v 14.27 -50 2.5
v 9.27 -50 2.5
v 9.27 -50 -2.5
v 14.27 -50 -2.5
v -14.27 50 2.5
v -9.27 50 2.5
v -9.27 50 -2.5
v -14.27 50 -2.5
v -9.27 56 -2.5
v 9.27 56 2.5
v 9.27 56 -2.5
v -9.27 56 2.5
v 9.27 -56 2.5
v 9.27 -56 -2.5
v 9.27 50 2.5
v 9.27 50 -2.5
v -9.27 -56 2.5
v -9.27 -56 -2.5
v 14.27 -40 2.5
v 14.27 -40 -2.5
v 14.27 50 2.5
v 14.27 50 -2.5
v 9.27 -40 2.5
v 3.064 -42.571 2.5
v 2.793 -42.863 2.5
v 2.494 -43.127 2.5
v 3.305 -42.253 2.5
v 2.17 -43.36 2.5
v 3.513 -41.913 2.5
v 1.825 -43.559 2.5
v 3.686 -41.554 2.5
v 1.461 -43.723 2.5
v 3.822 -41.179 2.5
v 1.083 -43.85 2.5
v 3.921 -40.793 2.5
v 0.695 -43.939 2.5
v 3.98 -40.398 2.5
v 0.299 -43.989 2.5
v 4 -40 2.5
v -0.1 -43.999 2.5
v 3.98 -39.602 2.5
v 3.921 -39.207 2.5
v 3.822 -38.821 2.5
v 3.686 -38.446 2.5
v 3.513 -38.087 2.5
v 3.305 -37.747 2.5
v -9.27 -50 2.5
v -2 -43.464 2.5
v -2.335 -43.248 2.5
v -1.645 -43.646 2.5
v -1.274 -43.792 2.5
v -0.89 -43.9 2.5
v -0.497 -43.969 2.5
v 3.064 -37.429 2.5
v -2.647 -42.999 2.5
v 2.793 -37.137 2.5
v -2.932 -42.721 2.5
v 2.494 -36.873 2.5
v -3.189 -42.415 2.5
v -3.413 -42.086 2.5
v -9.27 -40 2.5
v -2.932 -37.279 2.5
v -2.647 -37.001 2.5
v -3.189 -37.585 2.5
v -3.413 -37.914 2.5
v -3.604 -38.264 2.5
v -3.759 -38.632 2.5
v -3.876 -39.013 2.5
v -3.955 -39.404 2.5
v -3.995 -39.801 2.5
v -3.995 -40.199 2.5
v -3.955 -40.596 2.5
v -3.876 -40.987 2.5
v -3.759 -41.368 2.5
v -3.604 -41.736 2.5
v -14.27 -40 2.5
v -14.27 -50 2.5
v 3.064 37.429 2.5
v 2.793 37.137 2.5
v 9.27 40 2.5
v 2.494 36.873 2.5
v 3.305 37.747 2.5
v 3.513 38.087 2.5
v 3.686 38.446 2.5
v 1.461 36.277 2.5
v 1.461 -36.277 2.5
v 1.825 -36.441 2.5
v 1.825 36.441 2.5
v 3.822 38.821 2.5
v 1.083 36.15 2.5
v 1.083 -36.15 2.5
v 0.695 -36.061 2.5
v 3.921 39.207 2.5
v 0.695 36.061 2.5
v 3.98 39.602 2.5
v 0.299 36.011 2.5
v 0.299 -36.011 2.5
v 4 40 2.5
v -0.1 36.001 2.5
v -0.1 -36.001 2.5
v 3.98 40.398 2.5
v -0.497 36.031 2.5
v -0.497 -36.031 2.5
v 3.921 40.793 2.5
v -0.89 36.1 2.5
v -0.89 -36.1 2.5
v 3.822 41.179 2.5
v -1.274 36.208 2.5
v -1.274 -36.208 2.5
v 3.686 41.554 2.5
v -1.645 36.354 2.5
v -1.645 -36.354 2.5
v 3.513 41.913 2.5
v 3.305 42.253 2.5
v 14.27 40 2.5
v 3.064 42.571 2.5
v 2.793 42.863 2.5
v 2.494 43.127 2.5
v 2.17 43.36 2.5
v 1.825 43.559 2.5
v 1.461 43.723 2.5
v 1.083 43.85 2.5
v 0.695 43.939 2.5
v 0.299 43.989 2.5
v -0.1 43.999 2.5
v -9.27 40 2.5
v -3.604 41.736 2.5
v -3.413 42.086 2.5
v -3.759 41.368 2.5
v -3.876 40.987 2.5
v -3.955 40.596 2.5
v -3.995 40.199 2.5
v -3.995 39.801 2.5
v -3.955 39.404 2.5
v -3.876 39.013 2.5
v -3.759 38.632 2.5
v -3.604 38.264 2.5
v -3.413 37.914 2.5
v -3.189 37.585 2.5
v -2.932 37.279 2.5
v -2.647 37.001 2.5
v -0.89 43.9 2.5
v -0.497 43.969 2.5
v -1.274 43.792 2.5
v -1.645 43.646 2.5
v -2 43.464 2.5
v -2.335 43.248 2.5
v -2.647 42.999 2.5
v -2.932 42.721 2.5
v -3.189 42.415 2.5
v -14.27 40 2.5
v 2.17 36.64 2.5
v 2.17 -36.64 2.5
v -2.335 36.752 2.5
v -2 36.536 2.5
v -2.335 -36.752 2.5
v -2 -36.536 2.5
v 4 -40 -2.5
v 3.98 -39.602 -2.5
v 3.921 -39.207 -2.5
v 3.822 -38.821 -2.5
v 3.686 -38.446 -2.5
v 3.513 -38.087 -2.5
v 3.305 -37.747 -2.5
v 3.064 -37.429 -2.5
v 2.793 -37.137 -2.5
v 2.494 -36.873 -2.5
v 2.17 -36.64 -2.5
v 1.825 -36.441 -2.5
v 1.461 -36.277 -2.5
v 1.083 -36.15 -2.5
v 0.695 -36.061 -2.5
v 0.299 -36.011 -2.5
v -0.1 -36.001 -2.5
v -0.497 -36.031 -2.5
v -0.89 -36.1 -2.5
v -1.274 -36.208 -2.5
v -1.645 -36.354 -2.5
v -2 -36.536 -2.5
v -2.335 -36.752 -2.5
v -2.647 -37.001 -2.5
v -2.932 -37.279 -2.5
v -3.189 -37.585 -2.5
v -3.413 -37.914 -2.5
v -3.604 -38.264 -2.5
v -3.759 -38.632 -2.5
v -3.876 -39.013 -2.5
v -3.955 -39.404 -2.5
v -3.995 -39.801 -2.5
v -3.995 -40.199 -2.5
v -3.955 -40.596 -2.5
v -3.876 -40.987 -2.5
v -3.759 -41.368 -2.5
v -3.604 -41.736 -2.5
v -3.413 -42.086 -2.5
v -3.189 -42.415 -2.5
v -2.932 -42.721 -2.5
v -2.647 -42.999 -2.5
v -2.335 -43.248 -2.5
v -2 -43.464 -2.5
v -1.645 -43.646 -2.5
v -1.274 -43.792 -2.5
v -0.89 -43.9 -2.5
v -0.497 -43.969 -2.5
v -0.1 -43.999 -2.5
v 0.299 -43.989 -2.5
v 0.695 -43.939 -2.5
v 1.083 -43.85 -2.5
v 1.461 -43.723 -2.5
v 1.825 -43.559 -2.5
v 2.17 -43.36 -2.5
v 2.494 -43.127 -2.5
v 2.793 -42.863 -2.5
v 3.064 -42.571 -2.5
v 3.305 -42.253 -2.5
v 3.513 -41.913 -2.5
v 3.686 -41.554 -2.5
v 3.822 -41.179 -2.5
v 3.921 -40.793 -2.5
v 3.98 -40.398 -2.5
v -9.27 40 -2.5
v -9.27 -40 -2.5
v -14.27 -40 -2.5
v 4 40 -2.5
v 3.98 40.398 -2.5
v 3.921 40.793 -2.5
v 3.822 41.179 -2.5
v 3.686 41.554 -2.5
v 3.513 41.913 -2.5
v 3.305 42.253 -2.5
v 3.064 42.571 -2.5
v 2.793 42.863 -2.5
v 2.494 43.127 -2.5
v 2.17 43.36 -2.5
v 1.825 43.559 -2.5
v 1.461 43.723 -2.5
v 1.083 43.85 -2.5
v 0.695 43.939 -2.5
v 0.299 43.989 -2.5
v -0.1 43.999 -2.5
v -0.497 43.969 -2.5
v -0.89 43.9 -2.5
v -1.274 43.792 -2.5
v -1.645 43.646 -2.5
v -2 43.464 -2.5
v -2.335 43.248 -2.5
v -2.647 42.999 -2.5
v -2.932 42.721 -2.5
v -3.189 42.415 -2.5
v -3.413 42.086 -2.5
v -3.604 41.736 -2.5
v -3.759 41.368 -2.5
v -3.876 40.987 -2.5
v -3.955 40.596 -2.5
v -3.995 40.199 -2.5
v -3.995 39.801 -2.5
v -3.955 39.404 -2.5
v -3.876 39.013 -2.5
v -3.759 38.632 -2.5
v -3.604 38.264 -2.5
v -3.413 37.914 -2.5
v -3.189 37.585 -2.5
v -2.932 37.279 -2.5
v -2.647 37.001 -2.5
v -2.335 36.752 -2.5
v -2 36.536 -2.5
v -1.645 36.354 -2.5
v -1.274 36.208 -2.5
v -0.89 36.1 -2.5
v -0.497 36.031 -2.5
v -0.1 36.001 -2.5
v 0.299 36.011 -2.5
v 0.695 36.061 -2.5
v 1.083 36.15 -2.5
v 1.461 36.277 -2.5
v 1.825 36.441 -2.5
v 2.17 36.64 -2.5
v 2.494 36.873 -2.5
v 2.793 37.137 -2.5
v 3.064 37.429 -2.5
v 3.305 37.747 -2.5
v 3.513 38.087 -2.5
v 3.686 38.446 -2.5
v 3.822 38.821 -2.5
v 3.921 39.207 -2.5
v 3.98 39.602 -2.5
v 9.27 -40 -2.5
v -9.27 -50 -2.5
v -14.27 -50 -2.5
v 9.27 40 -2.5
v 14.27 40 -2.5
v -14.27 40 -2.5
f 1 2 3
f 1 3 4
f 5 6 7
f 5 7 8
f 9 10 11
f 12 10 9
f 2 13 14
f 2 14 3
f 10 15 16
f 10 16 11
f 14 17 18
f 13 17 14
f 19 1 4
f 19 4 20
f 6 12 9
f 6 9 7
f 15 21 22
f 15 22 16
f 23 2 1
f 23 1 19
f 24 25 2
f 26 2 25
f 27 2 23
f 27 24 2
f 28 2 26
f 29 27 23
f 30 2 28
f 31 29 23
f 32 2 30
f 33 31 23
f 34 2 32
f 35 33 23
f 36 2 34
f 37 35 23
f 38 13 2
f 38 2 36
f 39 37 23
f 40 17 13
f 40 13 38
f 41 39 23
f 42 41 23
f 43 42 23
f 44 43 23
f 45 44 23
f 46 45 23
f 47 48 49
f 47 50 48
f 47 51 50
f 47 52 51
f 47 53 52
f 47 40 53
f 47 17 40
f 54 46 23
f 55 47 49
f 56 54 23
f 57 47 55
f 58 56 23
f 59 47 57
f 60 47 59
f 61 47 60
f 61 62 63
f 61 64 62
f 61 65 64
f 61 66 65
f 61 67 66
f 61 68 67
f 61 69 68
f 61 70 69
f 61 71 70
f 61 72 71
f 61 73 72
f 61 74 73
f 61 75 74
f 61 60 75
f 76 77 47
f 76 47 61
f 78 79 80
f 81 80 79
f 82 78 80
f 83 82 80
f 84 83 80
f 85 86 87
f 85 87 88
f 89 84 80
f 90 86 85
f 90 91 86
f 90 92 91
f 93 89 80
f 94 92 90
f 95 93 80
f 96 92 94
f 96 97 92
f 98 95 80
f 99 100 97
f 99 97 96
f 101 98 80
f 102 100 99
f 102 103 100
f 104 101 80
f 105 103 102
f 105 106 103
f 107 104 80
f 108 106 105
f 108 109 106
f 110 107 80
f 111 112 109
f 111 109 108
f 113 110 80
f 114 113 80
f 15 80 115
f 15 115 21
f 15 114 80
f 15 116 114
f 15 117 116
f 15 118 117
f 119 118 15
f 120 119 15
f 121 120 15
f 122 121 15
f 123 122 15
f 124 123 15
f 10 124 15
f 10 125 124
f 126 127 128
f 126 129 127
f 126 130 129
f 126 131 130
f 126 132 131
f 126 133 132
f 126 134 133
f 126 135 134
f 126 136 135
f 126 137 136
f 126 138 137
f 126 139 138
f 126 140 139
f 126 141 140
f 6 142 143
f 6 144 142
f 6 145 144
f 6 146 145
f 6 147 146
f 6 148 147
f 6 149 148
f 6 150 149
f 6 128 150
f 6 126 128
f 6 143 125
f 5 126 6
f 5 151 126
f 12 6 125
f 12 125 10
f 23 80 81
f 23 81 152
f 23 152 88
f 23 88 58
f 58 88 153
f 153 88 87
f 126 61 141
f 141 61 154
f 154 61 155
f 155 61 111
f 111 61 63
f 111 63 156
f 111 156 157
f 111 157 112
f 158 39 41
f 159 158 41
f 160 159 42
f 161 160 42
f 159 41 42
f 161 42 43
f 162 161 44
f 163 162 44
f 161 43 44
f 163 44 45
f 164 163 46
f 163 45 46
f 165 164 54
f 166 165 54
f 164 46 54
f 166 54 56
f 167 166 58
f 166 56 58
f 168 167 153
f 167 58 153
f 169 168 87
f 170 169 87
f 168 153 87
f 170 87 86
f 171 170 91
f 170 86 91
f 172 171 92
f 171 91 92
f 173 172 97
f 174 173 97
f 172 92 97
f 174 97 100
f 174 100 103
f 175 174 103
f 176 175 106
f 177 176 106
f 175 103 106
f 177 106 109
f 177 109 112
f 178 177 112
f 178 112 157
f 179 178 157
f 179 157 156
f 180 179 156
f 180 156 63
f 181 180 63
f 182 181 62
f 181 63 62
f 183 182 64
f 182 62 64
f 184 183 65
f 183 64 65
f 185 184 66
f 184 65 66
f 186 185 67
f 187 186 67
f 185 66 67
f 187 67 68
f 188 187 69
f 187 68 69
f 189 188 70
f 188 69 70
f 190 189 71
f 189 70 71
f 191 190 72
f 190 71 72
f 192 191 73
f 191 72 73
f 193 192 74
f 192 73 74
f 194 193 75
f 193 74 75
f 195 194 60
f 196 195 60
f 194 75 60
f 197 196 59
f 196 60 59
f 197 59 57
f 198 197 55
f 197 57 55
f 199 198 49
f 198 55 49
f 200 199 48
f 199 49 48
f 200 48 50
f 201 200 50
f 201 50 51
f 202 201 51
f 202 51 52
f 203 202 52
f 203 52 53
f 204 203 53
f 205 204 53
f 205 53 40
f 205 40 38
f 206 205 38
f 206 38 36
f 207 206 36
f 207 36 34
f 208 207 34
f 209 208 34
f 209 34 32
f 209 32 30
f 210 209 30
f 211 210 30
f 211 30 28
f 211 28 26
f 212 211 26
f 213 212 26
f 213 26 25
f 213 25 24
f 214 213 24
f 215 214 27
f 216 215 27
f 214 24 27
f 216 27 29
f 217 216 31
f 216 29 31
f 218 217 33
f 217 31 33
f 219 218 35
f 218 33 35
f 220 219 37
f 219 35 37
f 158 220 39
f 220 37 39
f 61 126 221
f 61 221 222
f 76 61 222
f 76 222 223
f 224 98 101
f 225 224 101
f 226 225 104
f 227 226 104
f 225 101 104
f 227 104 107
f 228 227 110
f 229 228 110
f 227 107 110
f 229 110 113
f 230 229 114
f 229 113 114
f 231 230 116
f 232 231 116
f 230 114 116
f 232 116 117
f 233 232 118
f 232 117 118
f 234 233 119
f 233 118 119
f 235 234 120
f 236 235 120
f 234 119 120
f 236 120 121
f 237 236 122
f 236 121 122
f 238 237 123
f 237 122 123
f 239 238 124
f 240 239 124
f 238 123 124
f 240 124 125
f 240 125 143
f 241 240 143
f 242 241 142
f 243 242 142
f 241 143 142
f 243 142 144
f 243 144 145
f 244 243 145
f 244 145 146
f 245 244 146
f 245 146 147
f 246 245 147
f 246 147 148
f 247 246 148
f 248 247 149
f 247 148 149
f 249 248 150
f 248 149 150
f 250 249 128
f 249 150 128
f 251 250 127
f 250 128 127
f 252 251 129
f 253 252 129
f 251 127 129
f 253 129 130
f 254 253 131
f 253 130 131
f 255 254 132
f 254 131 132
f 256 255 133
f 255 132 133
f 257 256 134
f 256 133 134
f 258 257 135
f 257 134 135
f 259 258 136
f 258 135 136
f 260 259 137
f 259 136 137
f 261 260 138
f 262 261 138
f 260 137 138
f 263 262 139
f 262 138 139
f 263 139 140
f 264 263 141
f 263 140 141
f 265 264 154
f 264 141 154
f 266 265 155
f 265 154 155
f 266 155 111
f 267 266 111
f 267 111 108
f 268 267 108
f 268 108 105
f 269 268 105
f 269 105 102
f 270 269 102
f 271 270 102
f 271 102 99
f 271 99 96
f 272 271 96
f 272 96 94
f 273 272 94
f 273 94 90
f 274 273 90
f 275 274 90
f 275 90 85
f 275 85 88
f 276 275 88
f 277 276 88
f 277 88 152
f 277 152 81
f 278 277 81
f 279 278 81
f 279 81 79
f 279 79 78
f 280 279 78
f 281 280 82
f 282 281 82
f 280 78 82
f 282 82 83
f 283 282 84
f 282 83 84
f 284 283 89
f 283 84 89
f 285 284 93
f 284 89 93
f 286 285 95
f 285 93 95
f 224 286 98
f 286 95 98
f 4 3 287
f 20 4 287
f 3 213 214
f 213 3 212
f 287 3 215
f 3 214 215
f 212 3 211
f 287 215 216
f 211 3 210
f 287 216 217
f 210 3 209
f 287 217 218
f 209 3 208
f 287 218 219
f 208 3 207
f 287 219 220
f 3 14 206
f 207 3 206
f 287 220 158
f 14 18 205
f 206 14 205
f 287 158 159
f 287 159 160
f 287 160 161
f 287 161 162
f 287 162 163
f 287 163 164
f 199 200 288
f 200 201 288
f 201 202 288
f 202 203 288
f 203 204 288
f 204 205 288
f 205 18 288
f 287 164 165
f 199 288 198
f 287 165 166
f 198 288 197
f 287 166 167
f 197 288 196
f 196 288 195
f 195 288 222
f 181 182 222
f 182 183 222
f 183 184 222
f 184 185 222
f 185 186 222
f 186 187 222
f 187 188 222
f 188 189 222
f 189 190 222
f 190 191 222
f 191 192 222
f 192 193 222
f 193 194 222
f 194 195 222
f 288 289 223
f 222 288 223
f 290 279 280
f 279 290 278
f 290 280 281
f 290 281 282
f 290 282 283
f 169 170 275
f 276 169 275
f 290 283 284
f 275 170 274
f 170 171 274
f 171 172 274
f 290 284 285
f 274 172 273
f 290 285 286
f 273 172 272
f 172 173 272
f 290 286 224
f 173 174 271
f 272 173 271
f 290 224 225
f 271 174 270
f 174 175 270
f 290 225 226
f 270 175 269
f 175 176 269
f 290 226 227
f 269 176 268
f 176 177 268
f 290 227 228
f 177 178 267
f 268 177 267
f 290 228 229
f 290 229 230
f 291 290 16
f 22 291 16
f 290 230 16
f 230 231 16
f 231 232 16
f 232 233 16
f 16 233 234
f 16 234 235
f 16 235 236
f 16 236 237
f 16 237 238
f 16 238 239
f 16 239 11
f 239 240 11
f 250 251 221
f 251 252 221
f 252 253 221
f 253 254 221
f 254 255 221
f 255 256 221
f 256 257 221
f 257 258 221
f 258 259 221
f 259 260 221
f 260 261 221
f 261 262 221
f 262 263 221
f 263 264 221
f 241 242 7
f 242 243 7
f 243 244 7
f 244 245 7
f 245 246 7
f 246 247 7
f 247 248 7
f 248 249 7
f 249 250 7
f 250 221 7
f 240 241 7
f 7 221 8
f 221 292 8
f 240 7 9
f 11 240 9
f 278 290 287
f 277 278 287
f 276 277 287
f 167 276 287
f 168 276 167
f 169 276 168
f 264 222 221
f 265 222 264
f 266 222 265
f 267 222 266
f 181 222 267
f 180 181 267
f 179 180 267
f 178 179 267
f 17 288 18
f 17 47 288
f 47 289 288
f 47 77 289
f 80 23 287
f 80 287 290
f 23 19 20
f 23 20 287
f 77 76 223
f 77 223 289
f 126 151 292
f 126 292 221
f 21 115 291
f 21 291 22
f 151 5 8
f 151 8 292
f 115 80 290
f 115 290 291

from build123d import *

# Parameters (mm, degrees)
BOSS_EXTRUDE1_DEPTH = 2.5
SKETCH3_R           = 4
CUT_EXTRUDE2_DEPTH  = 5


with BuildPart() as part:
    # Sketch1 → Boss-Extrude1 (new, symmetric)
    with BuildSketch(Plane(origin=(0, 0, 0), x_dir=(0, 1, 0), z_dir=(0, 0, 1))):
        Polygon((-56, 9.27), (-56, -9.27), (-50, -9.27), (-50, -12.741071429), (-50, -14.27), (-40, -14.27), (-40, -10.192857143), (-40, -9.27), (40, -9.27), (40, -10.192857143), (40, -14.27), (50, -14.27), (50, -9.27), (56, -9.27), (56, 9.27), (50, 9.27), (50, 14.27), (40, 14.27), (40, 9.27), (-40, 9.27), (-40, 10.192857143), (-40, 14.27), (-50, 14.27), (-50, 12.741071429), (-50, 9.27), align=None)
    extrude(amount=BOSS_EXTRUDE1_DEPTH, both=True)

    # Sketch3 → Cut-Extrude2 (cut)
    with BuildSketch(Plane.XY.offset(2.5)):
        with Locations((0, 40)):
            Circle(SKETCH3_R)
        with Locations((0, -40)):
            Circle(SKETCH3_R)
    extrude(amount=-CUT_EXTRUDE2_DEPTH, mode=Mode.SUBTRACT)


solid = part.part
